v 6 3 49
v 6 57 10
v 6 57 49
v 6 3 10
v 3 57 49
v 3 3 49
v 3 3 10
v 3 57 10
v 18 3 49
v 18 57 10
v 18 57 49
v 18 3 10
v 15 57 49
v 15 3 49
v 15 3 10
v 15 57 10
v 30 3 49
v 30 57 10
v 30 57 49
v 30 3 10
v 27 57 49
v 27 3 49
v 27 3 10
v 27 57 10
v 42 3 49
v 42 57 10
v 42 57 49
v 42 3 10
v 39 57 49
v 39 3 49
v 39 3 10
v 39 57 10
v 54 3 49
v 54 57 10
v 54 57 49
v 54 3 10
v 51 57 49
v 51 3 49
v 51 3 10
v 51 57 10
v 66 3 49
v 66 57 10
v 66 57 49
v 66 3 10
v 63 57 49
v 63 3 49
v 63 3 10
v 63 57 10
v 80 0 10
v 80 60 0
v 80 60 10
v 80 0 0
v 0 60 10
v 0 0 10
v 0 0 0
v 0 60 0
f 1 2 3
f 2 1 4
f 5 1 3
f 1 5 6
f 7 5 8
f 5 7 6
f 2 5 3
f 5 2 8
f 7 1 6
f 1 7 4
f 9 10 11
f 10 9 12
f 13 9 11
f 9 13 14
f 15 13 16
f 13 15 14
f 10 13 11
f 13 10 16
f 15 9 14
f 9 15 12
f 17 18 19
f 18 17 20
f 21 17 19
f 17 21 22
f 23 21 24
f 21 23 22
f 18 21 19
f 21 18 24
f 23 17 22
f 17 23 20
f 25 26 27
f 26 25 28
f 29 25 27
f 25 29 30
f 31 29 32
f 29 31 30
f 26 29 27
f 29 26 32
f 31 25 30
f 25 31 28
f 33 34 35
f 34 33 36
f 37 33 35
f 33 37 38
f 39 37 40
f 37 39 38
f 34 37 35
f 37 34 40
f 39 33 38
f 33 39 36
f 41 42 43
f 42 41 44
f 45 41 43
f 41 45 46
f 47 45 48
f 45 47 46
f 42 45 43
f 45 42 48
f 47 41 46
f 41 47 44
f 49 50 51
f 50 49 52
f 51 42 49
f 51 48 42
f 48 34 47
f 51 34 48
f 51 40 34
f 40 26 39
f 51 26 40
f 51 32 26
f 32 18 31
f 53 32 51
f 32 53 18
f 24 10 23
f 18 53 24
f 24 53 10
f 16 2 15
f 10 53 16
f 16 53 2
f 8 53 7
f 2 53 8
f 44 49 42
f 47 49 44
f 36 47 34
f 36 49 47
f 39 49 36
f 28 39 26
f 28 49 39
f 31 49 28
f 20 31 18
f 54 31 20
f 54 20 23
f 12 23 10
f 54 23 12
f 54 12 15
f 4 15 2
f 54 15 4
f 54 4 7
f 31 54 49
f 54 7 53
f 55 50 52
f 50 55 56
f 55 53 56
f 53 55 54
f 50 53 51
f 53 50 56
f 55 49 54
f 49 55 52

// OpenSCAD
$fn = 32;

// ----------------------------------------------------------------------
// Heatsink: uniform fin block
// ----------------------------------------------------------------------

// --- parameters (mm) ---
base_l = 80;              // base length, X
base_w = 60;              // base width, Y
base_t = 10;              // base plate thickness
fin_h = 40;               // fin height above the base
fin_t = 3;                // fin thickness
edge = 3;                 // margin from the base ends
pitch = 12;               // fin pitch
fit_tol = 0.1;            // tolerance for press fits, mm
free_tol = 0.3;           // tolerance for clearance fits, mm

n_fins = floor((base_l - 2 * edge - fin_t) / pitch) + 1;  // fin count
total_h = base_t + fin_h - 1;  // overall height

union() {
  cube([base_l, base_w, base_t]);
  for (i = [0 : n_fins - 1])
    translate([edge + i * pitch, edge, base_t - 1])
      cube([fin_t, base_w - 2 * edge, fin_h]);
}
